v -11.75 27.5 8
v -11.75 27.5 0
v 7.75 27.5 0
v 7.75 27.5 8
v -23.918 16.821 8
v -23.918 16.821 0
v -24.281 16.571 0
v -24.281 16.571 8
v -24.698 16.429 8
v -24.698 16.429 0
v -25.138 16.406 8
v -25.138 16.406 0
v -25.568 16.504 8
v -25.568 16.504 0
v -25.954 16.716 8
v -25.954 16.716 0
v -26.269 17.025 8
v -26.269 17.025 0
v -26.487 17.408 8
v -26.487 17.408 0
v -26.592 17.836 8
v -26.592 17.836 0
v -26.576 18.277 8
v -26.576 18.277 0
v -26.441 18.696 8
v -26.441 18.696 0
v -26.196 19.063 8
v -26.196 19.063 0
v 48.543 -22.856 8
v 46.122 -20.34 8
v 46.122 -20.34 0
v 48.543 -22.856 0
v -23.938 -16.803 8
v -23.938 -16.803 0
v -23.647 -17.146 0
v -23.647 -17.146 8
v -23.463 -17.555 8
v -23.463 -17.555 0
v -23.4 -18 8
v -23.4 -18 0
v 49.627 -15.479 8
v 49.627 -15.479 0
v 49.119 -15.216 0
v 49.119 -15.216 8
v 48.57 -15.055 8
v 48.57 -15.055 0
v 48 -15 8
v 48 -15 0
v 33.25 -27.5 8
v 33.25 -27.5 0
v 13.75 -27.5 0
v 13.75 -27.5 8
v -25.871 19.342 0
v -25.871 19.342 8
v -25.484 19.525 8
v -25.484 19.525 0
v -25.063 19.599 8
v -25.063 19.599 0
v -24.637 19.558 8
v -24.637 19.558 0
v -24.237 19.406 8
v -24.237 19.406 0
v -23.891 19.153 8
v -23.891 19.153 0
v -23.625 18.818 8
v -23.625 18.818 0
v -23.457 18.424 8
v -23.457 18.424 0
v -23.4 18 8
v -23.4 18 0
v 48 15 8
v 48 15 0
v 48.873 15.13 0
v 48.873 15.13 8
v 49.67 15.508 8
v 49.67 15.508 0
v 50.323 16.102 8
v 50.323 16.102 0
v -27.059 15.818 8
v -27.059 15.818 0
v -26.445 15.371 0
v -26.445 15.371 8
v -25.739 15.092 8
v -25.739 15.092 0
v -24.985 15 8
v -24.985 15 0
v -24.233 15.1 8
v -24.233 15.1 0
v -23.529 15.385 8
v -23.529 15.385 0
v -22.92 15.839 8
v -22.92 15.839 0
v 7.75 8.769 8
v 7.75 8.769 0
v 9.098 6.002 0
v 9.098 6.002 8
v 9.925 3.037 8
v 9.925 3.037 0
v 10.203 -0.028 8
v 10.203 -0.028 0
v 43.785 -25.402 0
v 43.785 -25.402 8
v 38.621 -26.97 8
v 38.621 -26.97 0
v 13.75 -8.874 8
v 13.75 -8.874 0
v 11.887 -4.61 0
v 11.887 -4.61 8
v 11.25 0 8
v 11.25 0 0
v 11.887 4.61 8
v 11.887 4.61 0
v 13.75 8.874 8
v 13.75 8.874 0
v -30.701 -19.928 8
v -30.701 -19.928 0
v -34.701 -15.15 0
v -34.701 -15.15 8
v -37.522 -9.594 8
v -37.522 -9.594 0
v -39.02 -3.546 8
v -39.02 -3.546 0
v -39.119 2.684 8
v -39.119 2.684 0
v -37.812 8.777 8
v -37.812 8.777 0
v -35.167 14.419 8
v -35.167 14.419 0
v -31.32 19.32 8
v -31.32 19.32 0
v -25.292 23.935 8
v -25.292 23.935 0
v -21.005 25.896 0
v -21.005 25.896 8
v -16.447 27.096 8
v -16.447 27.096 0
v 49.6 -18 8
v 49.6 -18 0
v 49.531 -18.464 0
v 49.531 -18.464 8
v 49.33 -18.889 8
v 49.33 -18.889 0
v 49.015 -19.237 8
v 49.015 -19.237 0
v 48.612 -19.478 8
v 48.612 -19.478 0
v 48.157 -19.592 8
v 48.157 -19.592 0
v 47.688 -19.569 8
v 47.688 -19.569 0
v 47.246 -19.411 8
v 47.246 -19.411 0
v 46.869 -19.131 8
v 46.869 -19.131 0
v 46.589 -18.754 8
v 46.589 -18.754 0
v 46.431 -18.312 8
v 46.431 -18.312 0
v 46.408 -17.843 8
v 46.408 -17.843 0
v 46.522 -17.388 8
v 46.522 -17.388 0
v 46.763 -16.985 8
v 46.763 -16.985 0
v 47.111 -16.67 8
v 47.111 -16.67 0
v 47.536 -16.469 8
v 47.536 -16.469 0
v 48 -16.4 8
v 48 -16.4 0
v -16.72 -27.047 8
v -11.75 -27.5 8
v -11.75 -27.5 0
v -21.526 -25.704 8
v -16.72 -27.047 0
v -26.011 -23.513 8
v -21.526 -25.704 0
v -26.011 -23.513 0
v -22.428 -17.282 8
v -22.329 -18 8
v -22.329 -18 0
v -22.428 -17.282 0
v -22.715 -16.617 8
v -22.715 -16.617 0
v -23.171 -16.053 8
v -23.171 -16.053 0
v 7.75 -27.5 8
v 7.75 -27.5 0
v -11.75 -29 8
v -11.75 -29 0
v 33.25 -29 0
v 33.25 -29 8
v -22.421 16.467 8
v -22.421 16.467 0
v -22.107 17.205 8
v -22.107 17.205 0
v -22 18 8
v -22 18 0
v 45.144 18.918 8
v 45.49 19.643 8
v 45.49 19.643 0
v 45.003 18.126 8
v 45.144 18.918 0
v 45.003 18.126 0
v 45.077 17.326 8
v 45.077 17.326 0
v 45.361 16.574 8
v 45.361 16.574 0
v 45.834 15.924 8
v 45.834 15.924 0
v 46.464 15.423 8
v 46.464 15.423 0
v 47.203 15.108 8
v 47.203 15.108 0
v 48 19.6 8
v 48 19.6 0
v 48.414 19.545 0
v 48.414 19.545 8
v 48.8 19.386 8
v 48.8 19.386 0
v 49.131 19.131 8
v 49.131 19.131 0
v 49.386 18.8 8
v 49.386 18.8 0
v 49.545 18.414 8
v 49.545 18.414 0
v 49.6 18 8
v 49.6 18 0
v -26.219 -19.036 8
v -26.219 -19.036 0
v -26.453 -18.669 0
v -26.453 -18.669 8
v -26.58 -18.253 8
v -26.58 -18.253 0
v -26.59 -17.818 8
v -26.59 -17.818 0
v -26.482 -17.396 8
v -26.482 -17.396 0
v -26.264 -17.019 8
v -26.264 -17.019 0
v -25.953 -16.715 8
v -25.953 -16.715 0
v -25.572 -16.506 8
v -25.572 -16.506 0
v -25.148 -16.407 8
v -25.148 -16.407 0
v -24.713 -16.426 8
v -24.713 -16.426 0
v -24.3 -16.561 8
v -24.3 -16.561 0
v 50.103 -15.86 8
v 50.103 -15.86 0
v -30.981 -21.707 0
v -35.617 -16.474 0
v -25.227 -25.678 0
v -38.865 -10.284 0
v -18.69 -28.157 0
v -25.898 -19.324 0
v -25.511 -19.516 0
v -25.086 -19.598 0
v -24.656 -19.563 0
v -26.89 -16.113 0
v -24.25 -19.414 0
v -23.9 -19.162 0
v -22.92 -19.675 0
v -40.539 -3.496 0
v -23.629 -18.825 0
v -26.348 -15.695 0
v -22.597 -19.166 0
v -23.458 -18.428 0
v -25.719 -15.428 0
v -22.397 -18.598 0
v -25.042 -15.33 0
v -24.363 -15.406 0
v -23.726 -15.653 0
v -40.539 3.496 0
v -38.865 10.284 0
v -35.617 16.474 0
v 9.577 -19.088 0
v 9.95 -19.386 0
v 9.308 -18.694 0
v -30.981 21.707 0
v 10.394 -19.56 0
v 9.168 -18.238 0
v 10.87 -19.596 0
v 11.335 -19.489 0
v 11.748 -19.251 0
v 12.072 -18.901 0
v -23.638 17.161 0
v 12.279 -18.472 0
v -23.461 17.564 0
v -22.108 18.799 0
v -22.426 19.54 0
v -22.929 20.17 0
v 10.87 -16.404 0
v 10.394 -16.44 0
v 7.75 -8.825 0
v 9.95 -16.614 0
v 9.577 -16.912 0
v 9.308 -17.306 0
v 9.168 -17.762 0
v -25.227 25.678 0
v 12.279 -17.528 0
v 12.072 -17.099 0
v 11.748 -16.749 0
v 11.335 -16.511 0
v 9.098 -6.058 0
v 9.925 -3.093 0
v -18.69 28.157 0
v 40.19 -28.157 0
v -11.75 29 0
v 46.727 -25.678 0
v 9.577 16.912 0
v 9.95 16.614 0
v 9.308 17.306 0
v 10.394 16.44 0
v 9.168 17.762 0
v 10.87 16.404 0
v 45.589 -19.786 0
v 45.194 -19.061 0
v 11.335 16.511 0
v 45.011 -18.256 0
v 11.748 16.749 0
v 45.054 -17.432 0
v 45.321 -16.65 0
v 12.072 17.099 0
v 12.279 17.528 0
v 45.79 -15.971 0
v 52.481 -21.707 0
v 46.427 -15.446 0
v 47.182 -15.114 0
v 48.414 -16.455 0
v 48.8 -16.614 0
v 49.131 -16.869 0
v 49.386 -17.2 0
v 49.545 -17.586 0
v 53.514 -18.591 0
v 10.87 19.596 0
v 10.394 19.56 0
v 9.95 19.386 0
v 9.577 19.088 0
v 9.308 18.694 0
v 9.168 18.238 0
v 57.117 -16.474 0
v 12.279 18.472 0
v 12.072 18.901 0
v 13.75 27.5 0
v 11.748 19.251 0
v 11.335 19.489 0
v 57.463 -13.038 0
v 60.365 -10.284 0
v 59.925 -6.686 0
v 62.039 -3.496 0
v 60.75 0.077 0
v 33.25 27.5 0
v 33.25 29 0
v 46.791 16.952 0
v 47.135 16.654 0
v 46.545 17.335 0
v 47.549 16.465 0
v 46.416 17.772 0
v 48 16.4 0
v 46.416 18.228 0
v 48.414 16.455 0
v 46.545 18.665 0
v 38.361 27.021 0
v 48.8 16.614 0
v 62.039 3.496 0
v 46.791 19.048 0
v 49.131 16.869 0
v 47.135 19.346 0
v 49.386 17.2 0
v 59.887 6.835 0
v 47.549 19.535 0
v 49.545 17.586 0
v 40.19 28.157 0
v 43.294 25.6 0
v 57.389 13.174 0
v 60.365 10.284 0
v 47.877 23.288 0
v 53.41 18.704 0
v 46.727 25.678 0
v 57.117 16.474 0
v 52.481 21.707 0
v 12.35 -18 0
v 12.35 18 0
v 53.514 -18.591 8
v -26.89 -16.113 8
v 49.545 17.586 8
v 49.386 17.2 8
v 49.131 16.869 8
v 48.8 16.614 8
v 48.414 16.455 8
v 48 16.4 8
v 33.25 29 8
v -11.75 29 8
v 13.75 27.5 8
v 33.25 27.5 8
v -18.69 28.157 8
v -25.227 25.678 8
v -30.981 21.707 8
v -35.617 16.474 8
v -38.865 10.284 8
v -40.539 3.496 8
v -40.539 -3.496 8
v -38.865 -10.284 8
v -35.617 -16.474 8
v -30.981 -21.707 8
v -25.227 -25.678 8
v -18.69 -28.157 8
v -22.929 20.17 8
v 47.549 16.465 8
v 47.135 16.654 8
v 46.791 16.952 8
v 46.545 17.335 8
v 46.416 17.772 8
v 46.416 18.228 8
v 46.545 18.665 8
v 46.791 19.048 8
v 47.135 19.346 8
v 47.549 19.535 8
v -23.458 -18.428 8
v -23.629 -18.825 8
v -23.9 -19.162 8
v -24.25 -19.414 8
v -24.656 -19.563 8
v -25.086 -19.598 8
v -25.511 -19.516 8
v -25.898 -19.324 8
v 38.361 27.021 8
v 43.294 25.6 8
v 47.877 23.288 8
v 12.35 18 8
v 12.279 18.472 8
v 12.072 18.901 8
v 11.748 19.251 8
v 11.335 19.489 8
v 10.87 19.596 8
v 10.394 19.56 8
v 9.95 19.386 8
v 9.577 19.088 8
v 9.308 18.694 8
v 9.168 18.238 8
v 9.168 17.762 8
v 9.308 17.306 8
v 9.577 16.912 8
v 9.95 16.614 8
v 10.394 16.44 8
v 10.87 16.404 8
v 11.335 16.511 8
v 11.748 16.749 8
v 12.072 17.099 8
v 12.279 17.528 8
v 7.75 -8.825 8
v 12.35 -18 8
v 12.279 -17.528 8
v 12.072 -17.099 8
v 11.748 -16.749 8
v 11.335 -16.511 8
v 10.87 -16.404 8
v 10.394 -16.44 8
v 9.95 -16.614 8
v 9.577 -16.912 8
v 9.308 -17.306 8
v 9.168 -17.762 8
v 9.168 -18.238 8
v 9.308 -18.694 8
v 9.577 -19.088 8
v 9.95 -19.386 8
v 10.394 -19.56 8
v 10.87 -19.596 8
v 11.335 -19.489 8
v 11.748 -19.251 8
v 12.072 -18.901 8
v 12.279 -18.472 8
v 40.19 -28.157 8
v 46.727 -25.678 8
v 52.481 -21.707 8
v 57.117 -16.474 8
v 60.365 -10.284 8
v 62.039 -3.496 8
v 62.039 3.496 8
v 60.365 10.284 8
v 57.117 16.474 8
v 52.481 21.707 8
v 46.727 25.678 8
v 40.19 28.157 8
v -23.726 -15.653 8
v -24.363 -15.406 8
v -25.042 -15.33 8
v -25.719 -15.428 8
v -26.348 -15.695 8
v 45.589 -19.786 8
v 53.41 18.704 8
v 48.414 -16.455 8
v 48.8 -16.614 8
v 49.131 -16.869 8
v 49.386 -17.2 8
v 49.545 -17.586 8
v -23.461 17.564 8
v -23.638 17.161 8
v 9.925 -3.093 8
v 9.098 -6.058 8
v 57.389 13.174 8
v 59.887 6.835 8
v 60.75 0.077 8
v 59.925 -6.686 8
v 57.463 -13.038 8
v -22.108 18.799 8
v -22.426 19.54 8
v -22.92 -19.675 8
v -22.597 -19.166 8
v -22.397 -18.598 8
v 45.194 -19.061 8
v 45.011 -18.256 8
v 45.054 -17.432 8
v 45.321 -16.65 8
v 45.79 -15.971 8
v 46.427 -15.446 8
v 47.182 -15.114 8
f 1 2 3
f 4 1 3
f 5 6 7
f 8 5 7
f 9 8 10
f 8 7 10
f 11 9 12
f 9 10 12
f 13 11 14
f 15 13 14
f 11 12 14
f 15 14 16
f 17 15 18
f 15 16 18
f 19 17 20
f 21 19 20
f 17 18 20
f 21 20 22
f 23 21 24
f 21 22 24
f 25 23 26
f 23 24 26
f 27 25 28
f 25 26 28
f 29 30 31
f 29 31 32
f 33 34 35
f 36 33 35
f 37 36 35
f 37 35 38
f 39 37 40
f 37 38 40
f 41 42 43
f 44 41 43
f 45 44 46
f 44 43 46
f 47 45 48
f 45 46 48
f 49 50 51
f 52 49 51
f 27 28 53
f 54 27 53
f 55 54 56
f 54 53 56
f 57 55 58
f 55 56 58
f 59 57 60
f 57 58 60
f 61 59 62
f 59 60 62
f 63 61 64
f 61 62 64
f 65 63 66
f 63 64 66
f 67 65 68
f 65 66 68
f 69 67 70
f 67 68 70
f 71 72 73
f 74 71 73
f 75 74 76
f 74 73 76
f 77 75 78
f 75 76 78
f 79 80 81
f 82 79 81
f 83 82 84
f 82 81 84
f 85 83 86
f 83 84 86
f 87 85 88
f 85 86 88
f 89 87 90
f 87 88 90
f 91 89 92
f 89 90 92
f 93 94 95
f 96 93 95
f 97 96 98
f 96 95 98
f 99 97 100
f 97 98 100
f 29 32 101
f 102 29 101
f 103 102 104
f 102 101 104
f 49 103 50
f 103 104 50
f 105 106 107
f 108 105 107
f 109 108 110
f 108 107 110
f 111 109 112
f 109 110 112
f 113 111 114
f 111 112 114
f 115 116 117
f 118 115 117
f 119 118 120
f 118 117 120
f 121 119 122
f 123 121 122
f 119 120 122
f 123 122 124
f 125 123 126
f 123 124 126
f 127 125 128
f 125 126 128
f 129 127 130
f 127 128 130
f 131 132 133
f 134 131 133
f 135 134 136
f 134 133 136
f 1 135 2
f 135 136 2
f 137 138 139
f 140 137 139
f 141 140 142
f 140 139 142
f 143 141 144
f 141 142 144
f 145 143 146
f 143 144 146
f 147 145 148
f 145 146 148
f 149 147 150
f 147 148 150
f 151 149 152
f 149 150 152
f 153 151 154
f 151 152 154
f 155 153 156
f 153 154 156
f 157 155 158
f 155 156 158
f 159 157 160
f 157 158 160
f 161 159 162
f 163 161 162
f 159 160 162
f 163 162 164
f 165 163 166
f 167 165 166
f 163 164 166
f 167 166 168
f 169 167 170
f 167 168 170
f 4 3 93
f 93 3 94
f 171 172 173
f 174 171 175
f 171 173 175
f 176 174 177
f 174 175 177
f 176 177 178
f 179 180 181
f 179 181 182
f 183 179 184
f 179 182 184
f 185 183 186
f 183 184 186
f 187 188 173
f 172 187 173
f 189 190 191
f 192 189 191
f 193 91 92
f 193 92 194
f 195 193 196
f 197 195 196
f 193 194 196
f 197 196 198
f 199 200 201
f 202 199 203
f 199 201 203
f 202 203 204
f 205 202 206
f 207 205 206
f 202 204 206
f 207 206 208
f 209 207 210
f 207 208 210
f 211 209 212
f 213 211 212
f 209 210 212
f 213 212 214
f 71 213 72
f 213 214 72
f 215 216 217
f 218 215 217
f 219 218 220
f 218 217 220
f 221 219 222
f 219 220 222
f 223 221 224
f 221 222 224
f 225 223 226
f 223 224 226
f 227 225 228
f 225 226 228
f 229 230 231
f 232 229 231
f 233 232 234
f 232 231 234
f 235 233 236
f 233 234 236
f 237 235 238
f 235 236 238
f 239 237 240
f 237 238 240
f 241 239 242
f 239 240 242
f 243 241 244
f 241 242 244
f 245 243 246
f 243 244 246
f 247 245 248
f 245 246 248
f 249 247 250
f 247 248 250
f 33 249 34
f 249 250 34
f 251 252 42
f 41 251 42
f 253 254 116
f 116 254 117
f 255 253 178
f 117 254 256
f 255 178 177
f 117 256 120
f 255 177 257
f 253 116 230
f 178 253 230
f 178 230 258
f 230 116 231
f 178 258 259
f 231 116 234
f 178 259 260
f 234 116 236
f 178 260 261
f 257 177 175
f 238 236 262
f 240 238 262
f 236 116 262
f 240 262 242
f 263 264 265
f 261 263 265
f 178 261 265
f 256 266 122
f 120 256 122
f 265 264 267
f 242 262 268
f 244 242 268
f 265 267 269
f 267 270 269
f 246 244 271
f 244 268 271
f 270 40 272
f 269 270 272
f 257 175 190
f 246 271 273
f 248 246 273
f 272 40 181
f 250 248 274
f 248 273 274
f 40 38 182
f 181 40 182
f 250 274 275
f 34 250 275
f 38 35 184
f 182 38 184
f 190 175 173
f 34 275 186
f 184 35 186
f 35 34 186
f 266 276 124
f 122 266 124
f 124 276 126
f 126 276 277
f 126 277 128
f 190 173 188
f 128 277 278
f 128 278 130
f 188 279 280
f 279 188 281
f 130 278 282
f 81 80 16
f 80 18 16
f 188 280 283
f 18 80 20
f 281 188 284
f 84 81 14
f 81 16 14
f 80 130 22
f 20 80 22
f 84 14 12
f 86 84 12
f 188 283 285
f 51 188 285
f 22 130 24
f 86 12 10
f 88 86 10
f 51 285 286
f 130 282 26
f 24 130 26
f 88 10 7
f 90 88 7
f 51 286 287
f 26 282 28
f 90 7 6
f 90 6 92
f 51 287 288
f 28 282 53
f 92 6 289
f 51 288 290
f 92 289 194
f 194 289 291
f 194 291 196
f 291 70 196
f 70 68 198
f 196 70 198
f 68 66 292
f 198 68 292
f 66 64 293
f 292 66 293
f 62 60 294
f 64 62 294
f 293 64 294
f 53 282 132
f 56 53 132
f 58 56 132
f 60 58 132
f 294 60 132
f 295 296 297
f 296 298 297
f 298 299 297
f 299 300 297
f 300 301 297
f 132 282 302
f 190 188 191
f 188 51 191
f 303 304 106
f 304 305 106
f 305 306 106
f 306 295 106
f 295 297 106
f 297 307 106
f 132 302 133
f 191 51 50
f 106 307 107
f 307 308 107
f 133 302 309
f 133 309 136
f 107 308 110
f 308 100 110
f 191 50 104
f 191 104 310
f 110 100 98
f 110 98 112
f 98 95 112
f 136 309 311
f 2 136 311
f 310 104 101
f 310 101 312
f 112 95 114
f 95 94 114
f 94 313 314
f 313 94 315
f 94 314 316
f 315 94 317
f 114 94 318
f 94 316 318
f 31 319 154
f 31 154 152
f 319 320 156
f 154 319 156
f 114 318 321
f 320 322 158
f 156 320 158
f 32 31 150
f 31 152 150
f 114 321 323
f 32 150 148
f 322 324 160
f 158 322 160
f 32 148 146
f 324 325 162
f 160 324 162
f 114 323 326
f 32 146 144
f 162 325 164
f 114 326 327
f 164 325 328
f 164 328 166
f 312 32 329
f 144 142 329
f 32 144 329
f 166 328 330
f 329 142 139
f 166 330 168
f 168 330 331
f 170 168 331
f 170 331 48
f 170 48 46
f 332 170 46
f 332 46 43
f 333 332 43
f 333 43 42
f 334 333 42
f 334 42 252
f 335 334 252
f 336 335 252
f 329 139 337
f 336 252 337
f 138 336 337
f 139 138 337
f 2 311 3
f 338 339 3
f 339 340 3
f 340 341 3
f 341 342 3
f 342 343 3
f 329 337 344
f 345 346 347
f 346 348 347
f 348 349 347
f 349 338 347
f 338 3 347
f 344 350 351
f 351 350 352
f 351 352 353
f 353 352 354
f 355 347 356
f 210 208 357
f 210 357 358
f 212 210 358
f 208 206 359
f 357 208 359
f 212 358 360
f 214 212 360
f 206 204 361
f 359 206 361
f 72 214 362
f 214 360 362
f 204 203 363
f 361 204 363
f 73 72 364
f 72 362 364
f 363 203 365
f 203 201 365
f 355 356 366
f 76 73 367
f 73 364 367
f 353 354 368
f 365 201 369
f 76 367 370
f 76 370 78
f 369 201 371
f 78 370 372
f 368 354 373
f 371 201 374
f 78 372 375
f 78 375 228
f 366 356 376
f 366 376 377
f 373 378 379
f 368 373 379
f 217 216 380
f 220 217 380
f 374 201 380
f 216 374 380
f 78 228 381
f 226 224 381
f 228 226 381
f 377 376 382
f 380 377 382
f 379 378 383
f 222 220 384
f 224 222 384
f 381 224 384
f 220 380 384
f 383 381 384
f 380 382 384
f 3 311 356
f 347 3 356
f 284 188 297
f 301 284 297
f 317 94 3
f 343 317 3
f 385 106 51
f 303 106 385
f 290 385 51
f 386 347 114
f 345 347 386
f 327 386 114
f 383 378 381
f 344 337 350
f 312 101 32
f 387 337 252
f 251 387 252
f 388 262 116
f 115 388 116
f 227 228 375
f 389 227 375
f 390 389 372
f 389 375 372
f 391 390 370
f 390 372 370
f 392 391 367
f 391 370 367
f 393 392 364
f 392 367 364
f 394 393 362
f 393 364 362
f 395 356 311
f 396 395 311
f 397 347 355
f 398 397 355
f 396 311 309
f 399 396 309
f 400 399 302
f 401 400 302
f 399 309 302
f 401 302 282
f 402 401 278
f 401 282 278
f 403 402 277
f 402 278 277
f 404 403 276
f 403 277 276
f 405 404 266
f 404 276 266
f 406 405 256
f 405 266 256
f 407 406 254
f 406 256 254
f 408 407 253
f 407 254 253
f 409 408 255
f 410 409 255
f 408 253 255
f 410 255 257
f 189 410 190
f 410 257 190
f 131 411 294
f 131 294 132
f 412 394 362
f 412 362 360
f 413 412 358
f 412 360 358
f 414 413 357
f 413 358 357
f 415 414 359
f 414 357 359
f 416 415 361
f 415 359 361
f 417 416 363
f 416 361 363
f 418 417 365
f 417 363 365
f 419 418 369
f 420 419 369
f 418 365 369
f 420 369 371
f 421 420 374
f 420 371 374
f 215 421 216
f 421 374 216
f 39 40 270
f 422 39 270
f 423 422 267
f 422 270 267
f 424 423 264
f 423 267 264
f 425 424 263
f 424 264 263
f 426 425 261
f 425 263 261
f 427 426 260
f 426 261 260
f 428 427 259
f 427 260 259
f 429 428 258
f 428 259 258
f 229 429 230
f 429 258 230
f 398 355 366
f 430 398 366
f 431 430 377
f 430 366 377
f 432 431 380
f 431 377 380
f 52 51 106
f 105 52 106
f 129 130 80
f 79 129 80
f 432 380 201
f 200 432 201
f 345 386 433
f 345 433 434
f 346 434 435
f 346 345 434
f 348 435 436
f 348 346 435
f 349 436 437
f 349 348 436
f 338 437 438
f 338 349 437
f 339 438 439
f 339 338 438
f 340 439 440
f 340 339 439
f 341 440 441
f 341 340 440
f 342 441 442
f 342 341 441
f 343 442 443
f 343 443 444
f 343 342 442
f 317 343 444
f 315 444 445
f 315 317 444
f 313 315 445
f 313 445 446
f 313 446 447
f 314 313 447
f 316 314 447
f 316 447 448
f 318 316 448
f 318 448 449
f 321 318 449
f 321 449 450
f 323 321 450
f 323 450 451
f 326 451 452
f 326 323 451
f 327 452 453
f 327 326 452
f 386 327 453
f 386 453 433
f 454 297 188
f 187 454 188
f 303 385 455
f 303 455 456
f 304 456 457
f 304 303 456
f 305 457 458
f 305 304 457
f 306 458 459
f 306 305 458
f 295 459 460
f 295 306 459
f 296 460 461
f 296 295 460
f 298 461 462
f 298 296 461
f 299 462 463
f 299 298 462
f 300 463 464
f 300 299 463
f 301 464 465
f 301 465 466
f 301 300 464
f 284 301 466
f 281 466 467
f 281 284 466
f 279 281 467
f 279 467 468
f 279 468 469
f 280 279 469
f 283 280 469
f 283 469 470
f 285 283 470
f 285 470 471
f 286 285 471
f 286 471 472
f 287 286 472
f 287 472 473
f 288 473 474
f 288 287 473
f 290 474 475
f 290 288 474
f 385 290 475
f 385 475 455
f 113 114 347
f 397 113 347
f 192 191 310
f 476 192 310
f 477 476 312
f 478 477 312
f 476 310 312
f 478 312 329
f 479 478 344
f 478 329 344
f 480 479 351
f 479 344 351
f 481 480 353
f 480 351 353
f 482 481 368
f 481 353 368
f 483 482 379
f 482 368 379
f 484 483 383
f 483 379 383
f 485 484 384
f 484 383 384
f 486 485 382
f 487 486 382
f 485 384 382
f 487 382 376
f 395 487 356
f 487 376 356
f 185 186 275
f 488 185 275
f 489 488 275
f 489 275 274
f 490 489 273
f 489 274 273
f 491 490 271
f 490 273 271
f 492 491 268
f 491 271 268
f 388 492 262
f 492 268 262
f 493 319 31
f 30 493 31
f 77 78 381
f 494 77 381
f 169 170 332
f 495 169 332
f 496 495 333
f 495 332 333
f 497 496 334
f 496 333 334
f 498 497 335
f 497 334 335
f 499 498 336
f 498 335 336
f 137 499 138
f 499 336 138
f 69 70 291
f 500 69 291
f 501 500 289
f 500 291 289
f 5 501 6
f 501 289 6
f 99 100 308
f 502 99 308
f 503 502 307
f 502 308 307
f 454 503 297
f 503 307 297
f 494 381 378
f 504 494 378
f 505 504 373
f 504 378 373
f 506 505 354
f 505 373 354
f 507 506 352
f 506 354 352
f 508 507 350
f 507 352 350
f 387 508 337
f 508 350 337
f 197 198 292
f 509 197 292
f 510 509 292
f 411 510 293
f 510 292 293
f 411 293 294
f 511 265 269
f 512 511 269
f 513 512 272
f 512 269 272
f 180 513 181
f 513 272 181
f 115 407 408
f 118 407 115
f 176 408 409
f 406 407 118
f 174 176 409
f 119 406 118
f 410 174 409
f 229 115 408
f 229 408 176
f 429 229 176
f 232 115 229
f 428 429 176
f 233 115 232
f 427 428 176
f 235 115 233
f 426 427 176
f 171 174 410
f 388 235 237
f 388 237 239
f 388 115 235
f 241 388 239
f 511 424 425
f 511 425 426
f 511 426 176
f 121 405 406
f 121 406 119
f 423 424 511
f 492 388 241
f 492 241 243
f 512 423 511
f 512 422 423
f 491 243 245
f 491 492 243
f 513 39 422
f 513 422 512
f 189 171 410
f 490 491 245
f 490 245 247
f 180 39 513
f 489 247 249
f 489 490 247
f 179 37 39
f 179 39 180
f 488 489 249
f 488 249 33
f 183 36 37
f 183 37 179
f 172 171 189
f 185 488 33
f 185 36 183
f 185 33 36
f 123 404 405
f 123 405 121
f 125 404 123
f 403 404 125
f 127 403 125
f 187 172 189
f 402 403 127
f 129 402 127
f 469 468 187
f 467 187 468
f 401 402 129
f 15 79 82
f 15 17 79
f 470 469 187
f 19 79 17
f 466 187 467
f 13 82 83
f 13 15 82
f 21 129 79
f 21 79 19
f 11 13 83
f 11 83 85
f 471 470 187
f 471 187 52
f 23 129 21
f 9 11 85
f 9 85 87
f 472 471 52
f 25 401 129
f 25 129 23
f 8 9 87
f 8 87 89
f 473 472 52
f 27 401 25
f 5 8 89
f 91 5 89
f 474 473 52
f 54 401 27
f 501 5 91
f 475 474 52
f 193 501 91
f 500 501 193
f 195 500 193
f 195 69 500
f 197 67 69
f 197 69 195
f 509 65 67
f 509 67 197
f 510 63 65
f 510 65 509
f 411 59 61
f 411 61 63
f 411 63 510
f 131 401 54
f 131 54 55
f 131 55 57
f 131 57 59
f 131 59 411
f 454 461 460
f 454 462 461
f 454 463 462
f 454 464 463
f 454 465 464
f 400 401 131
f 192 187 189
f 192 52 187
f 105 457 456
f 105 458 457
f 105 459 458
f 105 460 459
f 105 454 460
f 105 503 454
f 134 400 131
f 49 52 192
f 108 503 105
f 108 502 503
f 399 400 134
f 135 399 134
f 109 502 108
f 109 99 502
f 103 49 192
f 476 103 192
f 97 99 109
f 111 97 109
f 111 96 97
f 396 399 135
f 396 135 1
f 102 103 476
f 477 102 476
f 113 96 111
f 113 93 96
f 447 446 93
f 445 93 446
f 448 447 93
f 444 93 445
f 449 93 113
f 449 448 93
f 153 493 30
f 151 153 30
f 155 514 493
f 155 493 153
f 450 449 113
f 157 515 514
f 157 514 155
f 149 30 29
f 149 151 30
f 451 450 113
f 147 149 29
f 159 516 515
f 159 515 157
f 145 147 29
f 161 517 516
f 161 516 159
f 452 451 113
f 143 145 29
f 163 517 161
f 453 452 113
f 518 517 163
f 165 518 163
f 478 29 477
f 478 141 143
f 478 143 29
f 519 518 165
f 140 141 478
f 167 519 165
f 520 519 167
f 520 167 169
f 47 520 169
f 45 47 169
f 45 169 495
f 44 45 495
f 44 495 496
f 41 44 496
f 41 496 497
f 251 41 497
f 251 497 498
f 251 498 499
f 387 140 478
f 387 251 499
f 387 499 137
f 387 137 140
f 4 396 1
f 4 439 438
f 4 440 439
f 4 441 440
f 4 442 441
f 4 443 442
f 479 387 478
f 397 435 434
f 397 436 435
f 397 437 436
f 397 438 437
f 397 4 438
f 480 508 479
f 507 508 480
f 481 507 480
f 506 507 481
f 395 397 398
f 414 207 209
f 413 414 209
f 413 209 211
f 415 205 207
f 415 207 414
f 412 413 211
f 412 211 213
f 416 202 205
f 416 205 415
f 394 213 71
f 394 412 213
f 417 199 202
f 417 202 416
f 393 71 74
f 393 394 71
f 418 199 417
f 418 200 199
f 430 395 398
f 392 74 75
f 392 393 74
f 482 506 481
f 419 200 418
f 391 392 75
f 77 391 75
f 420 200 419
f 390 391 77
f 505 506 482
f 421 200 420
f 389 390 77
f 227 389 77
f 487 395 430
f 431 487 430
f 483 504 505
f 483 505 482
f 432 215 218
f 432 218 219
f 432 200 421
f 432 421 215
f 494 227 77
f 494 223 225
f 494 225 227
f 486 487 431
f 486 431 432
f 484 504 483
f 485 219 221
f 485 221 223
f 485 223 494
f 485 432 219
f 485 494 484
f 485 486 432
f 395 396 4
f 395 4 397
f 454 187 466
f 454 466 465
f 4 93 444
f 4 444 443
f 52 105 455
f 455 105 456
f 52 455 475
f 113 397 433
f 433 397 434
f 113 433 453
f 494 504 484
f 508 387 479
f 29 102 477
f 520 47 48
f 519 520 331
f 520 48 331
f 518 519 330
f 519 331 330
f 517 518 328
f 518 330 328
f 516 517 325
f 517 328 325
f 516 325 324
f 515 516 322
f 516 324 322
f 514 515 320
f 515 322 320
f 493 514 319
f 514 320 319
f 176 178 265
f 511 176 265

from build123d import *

# Parameters (mm, degrees)
F0_R     = 1.6
F1_DEPTH = 8


with BuildPart() as f1:
    # F0 (on Top) → F1 (new body)
    with BuildSketch(Plane.XY):
        with BuildLine():
            ThreePointArc((7.75, 8.769357237), (9.5785114413, 4.5384947039), (10.2033247314, -0.028042301))
            ThreePointArc((10.2033247314, -0.028042301), (9.5785114413, -4.5945793059), (7.75, -8.825441839))
            Line((7.75, -8.825441839), (7.75, -18.0000000146))
            ThreePointArc((7.75, -18.0000000146), (10.7499999927, -15), (13.75, -18))
            Line((13.75, -18), (13.75, -8.8741196746))
            ThreePointArc((13.75, -8.8741196746), (11.25, 0), (13.75, 8.8741196746))
            Line((13.75, 8.8741196746), (13.75, 18))
            ThreePointArc((13.75, 18), (10.75, 15), (7.75, 18))
            Line((7.75, 18), (7.75, 8.769357237))
        make_face()
        with BuildLine():
            Line((7.75, 27.5), (7.75, 18))
            ThreePointArc((7.75, 18), (10.75, 21), (13.75, 18))
            Line((13.75, 18), (13.75, 27.5))
            Line((13.75, 27.5), (7.75, 27.5))
        make_face()
        with BuildLine():
            ThreePointArc((13.75, 18), (10.75, 21), (7.75, 18))
            ThreePointArc((7.75, 18), (10.75, 15), (13.75, 18))
        make_face()
        with Locations((10.75, 18)):
            Circle(F0_R, mode=Mode.SUBTRACT)
        with BuildLine():
            ThreePointArc((13.75, -18), (10.7499999927, -15), (7.75, -18.0000000146))
            ThreePointArc((7.75, -18.0000000146), (10.7500000073, -21), (13.75, -18))
        make_face()
        with Locations((10.75, -18)):
            Circle(F0_R, mode=Mode.SUBTRACT)
        with BuildLine():
            ThreePointArc((13.75, -18), (10.7500000073, -21), (7.75, -18.0000000146))
            Line((7.75, -18.0000000146), (7.75, -27.5))
            Line((7.75, -27.5), (13.75, -27.5))
            Line((13.75, -27.5), (13.75, -18))
        make_face()
        with BuildLine():
            ThreePointArc((-25.2919277241, 23.9346233209), (-18.7517090297, 26.593722392), (-11.75, 27.5))
            Line((-11.75, 27.5), (-11.75, 29))
            ThreePointArc((-11.75, 29), (-40.75, 0), (-11.75, -29))
            Line((-11.75, -29), (-11.75, -27.5))
            ThreePointArc((-11.75, -27.5), (-19.1538130954, -26.4845908341), (-26.0108698504, -23.5133492108))
            ThreePointArc((-26.0108698504, -23.5133492108), (-27.4397291664, -22.5850038451), (-28.8083510414, -21.5699480701))
            ThreePointArc((-28.8083510414, -21.5699480701), (-29.7732335043, -20.7704851664), (-30.7006958236, -19.9278982284))
            ThreePointArc((-30.7006958236, -19.9278982284), (-39.2465788178, -0.4337664292), (-31.3198462511, 19.3202256122))
            ThreePointArc((-31.3198462511, 19.3202256122), (-30.0815714824, 20.4988655048), (-28.77245464, 21.5982878495))
            ThreePointArc((-28.77245464, 21.5982878495), (-27.0767734107, 22.8328714098), (-25.2919277241, 23.9346233209))
        make_face()
        Polygon((-11.75, 29), (-11.75, 27.5), (7.75, 27.5), (13.75, 27.5), (33.25, 27.5), (33.25, 29), align=None)
        Polygon((7.75, -27.5), (-11.75, -27.5), (-11.75, -29), (33.25, -29), (33.25, -27.5), (13.75, -27.5), align=None)
        with BuildLine():
            Line((-23.9181566023, 16.8211807336), (-22.9196159905, 15.8385184773))
            ThreePointArc((-22.9196159905, 15.8385184773), (-22.2394609196, 16.8255111811), (-22, 18))
            ThreePointArc((-22, 18), (-22.2419209631, 19.180254221), (-22.9286666841, 20.1701562834))
            ThreePointArc((-22.9286666841, 20.1701562834), (-25.0876469222, 20.9987193962), (-27.1945482113, 20.0454725978))
            Line((-27.1945482113, 20.0454725978), (-26.1960075994, 19.0628103416))
            ThreePointArc((-26.1960075994, 19.0628103416), (-24.4314985308, 19.4955955601), (-23.4, 18))
            ThreePointArc((-23.4, 18), (-23.5352560913, 17.3561636218), (-23.9181566023, 16.8211807336))
        make_face()
        with BuildLine():
            ThreePointArc((-27.0590321397, 15.818168969), (-24.9852520778, 15.0000362504), (-22.9196159905, 15.8385184773))
            Line((-22.9196159905, 15.8385184773), (-23.9181566023, 16.8211807336))
            ThreePointArc((-23.9181566023, 16.8211807336), (-26.122267433, 16.8595984002), (-26.1960075994, 19.0628103416))
            Line((-26.1960075994, 19.0628103416), (-27.1945482113, 20.0454725978))
            ThreePointArc((-27.1945482113, 20.0454725978), (-27.9984596784, 17.9038773857), (-27.0590321397, 15.818168969))
        make_face()
        with BuildLine():
            Line((-22.9286666841, 20.1701562834), (-25.2919277241, 23.9346233209))
            ThreePointArc((-25.2919277241, 23.9346233209), (-27.0767734107, 22.8328714098), (-28.77245464, 21.5982878495))
            Line((-28.77245464, 21.5982878495), (-27.1945482113, 20.0454725978))
            ThreePointArc((-27.1945482113, 20.0454725978), (-25.0876469222, 20.9987193962), (-22.9286666841, 20.1701562834))
        make_face()
        with BuildLine():
            ThreePointArc((-22.3292838603, -18), (-22.5488627131, -16.9395045028), (-23.1714929463, -16.053390986))
            Line((-23.1714929463, -16.053390986), (-23.9378571629, -16.8033995681))
            ThreePointArc((-23.9378571629, -16.8033995681), (-23.5406459409, -17.3440383164), (-23.4, -18))
            ThreePointArc((-23.4, -18), (-24.4480811477, -19.5017941205), (-26.2192319756, -19.0360856093))
            Line((-26.2192319756, -19.0360856093), (-26.9855961921, -19.7860941914))
            ThreePointArc((-26.9855961921, -19.7860941914), (-24.9271170835, -20.6697214797), (-22.9199137797, -19.6751017924))
            ThreePointArc((-22.9199137797, -19.6751017924), (-22.4812657406, -18.8880892011), (-22.3292838603, -18))
        make_face()
        with BuildLine():
            Line((-23.9378571629, -16.8033995681), (-23.1714929463, -16.053390986))
            ThreePointArc((-23.1714929463, -16.053390986), (-25.0424895986, -15.3296218746), (-26.8895125058, -16.1125500829))
            ThreePointArc((-26.8895125058, -16.1125500829), (-27.6698030703, -17.9301697453), (-26.9855961921, -19.7860941914))
            Line((-26.9855961921, -19.7860941914), (-26.2192319756, -19.0360856093))
            ThreePointArc((-26.2192319756, -19.0360856093), (-26.1191027607, -16.8564926712), (-23.9378571629, -16.8033995681))
        make_face()
        with BuildLine():
            ThreePointArc((-28.8083510414, -21.5699480701), (-27.4397291664, -22.5850038451), (-26.0108698504, -23.5133492108))
            Line((-26.0108698504, -23.5133492108), (-22.9199137797, -19.6751017924))
            ThreePointArc((-22.9199137797, -19.6751017924), (-24.9271170835, -20.6697214797), (-26.9855961921, -19.7860941914))
            Line((-26.9855961921, -19.7860941914), (-28.8083510414, -21.5699480701))
        make_face()
        with BuildLine():
            Line((-31.3198462511, 19.3202256122), (-27.0590321397, 15.818168969))
            ThreePointArc((-27.0590321397, 15.818168969), (-27.9984596784, 17.9038773857), (-27.1945482113, 20.0454725978))
            Line((-27.1945482113, 20.0454725978), (-28.77245464, 21.5982878495))
            ThreePointArc((-28.77245464, 21.5982878495), (-30.0815714824, 20.4988655048), (-31.3198462511, 19.3202256122))
        make_face()
        with BuildLine():
            ThreePointArc((33.25, -29), (62.25, 0), (33.25, 29))
            Line((33.25, 29), (33.25, 27.5))
            ThreePointArc((33.25, 27.5), (40.8605006229, 26.4259395343), (47.8765184935, 23.2876567468))
            ThreePointArc((47.8765184935, 23.2876567468), (50.7935969105, 21.177162403), (53.4099454165, 18.7036520713))
            ThreePointArc((53.4099454165, 18.7036520713), (60.7498923776, 0.0769364868), (53.514283477, -18.5905571505))
            ThreePointArc((53.514283477, -18.5905571505), (51.1559396917, -20.8716871325), (48.5427019981, -22.8557053183))
            ThreePointArc((48.5427019981, -22.8557053183), (41.2411858865, -26.3133226356), (33.25, -27.5))
            Line((33.25, -27.5), (33.25, -29))
        make_face()
        with BuildLine():
            ThreePointArc((-26.9855961921, -19.7860941914), (-27.6698030703, -17.9301697453), (-26.8895125058, -16.1125500829))
            Line((-26.8895125058, -16.1125500829), (-30.7006958236, -19.9278982284))
            ThreePointArc((-30.7006958236, -19.9278982284), (-29.7732335043, -20.7704851664), (-28.8083510414, -21.5699480701))
            Line((-28.8083510414, -21.5699480701), (-26.9855961921, -19.7860941914))
        make_face()
        with BuildLine():
            ThreePointArc((53.4099454165, 18.7036520713), (50.7935969105, 21.177162403), (47.8765184935, 23.2876567468))
            Line((47.8765184935, 23.2876567468), (45.4902157392, 19.6434667518))
            ThreePointArc((45.4902157392, 19.6434667518), (48.8575101217, 20.8748350198), (51, 18))
            ThreePointArc((51, 18), (50.8256587545, 16.9922040865), (50.3228982644, 16.1015417695))
            Line((50.3228982644, 16.1015417695), (53.4099454165, 18.7036520713))
        make_face()
        with BuildLine():
            Line((46.1222517122, -20.3396712093), (48.5427019981, -22.8557053183))
            ThreePointArc((48.5427019981, -22.8557053183), (51.1559396917, -20.8716871325), (53.514283477, -18.5905571505))
            Line((53.514283477, -18.5905571505), (50.1028595569, -15.8603781447))
            ThreePointArc((50.1028595569, -15.8603781447), (50.7666386348, -16.8399523007), (51, -18))
            ThreePointArc((51, -18), (49.2974504107, -20.7049255871), (46.1222517122, -20.3396712093))
        make_face()
        with BuildLine():
            ThreePointArc((51, 18), (48.8575101217, 20.8748350198), (45.4902157392, 19.6434667518))
            ThreePointArc((45.4902157392, 19.6434667518), (45.3608334407, 16.5735358847), (48, 15))
            ThreePointArc((48, 15), (49.2854231421, 15.2893382089), (50.3228982644, 16.1015417695))
            ThreePointArc((50.3228982644, 16.1015417695), (50.8256587545, 16.9922040865), (51, 18))
        make_face()
        with BuildLine():
            ThreePointArc((49.6, 18), (49.1313708499, 16.8686291501), (48, 16.4))
            ThreePointArc((48, 16.4), (46.4, 18), (48, 19.6))
            ThreePointArc((48, 19.6), (49.1313708499, 19.1313708499), (49.6, 18))
        make_face(mode=Mode.SUBTRACT)
        with BuildLine():
            Line((45.5893930702, -19.7857699264), (46.1222517122, -20.3396712093))
            ThreePointArc((46.1222517122, -20.3396712093), (49.2974504107, -20.7049255871), (51, -18))
            ThreePointArc((51, -18), (50.7666386348, -16.8399523007), (50.1028595569, -15.8603781447))
            Line((50.1028595569, -15.8603781447), (49.6267696131, -15.4793610679))
            ThreePointArc((49.6267696131, -15.4793610679), (48.8479632079, -15.1223345576), (48, -15))
            ThreePointArc((48, -15), (45.3206988057, -16.6504278047), (45.5893930702, -19.7857699264))
        make_face()
        with BuildLine():
            ThreePointArc((49.6, -18), (46.8686291501, -19.1313708499), (48, -16.4))
            ThreePointArc((48, -16.4), (49.1313708499, -16.8686291501), (49.6, -18))
        make_face(mode=Mode.SUBTRACT)
    extrude(amount=F1_DEPTH)


solid = f1.part
